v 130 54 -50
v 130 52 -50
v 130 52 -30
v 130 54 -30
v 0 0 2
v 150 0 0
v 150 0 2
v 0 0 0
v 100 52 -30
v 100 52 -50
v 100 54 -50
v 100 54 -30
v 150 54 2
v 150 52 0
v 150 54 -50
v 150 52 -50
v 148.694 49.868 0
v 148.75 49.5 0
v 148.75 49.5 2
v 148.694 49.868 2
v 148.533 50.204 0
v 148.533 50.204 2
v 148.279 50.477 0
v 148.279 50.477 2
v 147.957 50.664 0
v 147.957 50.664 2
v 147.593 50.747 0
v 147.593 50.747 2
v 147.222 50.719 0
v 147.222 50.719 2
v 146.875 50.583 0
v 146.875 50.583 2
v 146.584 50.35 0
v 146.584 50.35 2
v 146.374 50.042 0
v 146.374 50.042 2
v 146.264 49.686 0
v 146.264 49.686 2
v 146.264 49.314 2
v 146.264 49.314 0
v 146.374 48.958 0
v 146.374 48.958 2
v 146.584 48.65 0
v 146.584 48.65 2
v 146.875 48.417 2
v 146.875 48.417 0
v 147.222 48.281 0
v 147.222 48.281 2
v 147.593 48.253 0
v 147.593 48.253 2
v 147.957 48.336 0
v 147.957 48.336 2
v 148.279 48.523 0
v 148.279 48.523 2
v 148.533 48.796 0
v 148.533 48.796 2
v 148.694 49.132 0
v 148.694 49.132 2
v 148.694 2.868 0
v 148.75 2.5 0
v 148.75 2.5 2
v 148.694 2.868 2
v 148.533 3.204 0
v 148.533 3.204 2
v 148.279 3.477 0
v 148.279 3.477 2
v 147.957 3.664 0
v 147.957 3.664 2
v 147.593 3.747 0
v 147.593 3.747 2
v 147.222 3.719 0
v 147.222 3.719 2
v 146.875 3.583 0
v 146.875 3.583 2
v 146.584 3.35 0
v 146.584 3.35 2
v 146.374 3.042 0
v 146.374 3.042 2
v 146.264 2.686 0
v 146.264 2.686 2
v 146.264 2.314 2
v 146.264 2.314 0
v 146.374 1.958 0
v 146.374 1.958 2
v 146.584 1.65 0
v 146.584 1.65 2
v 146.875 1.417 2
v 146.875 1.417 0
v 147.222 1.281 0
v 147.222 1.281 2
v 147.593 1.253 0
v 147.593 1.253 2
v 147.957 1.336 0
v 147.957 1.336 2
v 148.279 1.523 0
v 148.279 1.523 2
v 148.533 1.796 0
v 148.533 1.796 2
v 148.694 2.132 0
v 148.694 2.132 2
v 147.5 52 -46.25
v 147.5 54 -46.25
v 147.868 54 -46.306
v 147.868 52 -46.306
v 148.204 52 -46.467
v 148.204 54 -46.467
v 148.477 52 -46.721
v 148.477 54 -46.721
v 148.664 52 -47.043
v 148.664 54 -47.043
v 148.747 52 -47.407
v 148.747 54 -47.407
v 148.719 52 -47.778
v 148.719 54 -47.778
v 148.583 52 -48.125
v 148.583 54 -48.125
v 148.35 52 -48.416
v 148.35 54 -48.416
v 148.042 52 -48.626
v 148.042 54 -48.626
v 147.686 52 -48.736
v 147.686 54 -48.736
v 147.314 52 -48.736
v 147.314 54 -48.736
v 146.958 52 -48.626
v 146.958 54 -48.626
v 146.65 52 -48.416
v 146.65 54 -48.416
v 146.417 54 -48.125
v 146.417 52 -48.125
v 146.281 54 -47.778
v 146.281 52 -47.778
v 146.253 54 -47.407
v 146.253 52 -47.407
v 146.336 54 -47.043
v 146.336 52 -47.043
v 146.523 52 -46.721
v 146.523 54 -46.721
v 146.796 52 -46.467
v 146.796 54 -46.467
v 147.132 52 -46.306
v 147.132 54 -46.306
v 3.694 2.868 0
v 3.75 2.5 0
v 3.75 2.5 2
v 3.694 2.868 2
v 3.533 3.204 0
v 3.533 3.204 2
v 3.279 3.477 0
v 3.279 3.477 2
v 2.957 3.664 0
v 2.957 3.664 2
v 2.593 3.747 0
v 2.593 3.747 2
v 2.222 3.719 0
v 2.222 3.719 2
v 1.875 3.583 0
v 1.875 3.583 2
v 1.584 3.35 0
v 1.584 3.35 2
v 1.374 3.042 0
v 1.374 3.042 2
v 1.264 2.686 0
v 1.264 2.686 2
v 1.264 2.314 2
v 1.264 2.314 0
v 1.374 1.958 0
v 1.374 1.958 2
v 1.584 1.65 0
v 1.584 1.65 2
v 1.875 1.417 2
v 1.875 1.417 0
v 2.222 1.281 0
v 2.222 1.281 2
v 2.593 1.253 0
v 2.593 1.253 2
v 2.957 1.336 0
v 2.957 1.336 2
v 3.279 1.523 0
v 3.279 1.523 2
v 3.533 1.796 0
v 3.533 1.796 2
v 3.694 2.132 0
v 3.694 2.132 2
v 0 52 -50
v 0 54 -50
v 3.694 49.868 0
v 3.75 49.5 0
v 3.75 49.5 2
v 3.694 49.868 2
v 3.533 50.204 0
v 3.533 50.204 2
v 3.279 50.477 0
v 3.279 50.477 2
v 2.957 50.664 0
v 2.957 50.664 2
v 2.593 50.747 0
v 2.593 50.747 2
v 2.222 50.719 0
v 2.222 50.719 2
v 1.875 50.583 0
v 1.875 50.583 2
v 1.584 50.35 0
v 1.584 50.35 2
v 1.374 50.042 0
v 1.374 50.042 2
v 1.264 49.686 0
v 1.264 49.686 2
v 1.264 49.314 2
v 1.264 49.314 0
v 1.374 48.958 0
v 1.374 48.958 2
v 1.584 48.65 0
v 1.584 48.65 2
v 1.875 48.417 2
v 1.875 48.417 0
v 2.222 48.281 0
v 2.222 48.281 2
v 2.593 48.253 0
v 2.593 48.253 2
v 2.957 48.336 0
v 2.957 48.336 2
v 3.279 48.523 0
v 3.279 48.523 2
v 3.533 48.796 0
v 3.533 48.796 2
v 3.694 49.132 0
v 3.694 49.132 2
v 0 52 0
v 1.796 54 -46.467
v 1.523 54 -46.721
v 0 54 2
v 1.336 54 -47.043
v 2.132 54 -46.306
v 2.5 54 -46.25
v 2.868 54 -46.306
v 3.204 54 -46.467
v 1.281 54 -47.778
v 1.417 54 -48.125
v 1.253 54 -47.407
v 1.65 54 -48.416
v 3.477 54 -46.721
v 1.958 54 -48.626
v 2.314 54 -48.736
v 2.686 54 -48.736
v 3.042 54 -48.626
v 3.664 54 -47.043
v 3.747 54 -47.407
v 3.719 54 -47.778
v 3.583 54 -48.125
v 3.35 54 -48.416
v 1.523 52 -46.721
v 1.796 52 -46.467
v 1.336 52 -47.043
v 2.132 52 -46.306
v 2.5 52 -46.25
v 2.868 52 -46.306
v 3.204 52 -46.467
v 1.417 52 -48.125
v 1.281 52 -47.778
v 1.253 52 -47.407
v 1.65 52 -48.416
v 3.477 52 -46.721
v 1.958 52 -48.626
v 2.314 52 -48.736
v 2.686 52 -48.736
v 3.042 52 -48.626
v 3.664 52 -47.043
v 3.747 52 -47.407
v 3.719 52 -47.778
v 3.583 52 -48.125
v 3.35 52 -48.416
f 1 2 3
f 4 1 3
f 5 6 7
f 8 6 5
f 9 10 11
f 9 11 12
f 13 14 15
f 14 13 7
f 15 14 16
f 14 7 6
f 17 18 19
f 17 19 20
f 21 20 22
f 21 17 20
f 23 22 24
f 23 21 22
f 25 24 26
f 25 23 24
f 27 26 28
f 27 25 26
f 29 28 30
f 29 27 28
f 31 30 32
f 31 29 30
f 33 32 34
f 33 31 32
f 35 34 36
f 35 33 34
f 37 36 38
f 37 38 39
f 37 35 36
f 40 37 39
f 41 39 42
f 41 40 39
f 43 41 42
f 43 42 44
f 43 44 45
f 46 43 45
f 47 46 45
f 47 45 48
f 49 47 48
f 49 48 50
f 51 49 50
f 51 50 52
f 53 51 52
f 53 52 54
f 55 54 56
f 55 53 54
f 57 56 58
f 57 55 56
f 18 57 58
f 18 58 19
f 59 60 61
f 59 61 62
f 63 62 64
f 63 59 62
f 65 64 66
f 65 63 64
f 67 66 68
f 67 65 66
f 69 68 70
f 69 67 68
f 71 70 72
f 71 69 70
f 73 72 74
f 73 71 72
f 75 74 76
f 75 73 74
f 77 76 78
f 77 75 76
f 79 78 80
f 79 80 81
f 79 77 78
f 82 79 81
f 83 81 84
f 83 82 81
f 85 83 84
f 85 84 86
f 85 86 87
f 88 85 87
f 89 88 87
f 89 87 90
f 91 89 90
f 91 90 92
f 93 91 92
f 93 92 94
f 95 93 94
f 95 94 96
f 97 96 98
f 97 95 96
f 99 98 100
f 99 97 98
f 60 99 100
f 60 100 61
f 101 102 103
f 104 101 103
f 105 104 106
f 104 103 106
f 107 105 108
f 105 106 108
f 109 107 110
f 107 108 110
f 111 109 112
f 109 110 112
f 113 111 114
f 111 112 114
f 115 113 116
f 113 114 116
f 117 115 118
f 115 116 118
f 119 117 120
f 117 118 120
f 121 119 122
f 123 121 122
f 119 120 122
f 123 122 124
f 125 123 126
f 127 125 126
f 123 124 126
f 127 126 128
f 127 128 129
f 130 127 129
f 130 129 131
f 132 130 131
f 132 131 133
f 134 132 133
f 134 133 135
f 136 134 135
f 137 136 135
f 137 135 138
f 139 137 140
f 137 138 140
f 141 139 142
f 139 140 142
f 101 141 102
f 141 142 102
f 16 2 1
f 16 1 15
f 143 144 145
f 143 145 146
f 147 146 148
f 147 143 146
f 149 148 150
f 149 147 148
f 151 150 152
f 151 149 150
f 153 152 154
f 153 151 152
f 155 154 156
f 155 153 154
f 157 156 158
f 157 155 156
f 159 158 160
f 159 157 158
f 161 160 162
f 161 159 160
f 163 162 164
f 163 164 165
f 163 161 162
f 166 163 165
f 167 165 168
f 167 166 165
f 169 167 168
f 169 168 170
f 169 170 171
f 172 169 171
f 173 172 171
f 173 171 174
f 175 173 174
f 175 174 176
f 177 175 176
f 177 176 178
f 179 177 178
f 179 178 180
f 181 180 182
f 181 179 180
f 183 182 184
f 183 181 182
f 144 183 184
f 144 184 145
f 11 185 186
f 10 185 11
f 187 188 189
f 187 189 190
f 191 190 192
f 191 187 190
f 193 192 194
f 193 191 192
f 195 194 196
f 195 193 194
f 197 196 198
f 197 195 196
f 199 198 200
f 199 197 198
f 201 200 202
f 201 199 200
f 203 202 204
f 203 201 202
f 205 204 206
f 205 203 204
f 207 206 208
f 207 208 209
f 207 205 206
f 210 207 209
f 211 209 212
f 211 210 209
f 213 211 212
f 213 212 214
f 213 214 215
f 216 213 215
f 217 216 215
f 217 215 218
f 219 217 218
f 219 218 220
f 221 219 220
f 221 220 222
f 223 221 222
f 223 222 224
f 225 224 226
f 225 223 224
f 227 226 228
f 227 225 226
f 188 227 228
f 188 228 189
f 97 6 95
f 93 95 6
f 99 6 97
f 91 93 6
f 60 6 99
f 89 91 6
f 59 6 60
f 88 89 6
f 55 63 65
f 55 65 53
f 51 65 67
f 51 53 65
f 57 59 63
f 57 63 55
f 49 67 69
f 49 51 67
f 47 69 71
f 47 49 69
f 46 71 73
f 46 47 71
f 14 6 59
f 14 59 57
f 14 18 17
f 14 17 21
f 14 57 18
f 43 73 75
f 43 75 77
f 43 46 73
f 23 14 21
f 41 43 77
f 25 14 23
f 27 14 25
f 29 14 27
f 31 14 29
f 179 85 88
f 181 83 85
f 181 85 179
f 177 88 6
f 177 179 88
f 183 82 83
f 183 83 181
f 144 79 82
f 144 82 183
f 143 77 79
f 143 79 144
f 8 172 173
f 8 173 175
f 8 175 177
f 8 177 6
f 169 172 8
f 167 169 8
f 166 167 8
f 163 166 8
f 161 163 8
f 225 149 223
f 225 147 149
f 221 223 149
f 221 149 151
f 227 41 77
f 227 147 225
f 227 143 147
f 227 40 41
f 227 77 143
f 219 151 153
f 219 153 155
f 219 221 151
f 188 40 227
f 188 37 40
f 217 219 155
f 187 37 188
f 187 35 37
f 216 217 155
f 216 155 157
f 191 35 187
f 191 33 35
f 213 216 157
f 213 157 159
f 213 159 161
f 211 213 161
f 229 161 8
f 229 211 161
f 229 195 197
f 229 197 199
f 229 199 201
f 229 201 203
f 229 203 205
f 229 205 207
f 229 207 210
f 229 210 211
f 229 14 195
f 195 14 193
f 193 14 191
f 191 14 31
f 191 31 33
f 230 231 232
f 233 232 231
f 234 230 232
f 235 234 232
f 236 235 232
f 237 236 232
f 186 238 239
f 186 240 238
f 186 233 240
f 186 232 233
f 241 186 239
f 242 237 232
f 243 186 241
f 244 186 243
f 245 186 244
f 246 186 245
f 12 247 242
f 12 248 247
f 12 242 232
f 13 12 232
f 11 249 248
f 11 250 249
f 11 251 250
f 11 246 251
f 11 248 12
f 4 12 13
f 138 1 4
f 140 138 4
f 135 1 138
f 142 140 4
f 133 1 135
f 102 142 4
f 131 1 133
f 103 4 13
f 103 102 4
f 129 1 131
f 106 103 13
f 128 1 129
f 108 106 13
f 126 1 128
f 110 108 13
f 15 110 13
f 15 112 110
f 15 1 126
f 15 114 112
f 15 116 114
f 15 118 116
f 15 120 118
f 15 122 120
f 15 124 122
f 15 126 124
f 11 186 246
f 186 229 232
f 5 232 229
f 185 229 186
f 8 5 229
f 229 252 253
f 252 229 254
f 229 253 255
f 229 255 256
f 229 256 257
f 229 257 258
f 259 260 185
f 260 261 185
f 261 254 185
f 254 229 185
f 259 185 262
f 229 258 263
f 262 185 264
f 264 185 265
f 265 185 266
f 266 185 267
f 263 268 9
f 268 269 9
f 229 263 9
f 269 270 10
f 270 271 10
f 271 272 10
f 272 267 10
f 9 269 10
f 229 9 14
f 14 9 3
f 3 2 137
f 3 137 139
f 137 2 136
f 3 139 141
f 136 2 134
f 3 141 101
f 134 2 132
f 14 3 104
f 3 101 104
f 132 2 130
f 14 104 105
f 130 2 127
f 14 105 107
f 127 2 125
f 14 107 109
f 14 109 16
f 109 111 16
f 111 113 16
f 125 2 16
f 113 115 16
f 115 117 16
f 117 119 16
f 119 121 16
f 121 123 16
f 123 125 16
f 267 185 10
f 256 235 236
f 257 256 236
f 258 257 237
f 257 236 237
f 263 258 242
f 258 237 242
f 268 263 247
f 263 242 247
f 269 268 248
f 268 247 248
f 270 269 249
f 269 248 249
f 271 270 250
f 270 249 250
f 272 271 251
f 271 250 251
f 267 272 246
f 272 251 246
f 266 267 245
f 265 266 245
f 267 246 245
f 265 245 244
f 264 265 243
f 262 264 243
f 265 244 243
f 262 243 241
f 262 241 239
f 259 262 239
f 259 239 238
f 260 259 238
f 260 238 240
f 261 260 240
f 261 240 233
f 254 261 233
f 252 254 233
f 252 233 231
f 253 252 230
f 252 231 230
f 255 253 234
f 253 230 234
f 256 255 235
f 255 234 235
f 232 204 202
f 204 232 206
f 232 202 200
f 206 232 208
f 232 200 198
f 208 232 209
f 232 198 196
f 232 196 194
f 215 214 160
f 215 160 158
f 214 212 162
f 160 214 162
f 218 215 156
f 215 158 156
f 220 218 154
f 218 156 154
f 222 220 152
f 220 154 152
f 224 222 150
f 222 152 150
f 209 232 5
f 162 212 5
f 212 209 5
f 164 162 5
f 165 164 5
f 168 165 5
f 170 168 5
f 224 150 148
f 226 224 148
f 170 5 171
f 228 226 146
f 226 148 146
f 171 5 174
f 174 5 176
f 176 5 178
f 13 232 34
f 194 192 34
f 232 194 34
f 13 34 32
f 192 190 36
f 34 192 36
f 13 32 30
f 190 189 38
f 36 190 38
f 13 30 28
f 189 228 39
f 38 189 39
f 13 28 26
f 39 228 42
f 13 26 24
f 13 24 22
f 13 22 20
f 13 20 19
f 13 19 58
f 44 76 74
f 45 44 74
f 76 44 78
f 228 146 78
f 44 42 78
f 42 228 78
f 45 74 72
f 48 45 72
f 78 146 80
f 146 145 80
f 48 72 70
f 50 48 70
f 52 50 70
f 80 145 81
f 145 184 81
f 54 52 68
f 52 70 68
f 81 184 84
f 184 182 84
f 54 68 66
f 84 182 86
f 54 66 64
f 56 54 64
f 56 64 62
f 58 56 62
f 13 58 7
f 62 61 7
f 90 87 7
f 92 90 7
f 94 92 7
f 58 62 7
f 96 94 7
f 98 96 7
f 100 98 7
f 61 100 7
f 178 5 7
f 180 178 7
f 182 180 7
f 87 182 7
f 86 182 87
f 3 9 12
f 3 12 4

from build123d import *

# Parameters (mm, degrees)
SKIZZE1_R                       = 1.25
AUFSATZ_LINEAR_AUSTRAGEN1_DEPTH = 2
SKIZZE2_W                       = 150
SKIZZE2_H                       = 52
AUFSATZ_LINEAR_AUSTRAGEN2_DEPTH = 2
SKIZZE3_W                       = 30
SKIZZE3_H                       = 20
SCHNITT_LINEAR_AUSTRAGEN1_DEPTH = 2
SKIZZE5_R                       = 1.25
SCHNITT_LINEAR_AUSTRAGEN2_DEPTH = 2


with BuildPart() as part:
    # Skizze1 → Aufsatz-Linear austragen1 (new body)
    # profile 1 of 2: a face of its own
    with BuildSketch(Plane.XY):
        with BuildLine():
            Line((148, 39.858571571), (148, 12.141428429))
            ThreePointArc((148, 12.141428429), (147.219544457, 8.268445082), (145, 5))
            ThreePointArc((145, 5), (141.731554918, 2.780455543), (137.858571571, 2))
            Line((137.858571571, 2), (12.141428429, 2))
            ThreePointArc((12.141428429, 2), (8.268445082, 2.780455543), (5, 5))
            ThreePointArc((5, 5), (2.780455543, 8.268445082), (2, 12.141428429))
            Line((2, 12.141428429), (2, 39.858571571))
            ThreePointArc((2, 39.858571571), (2.780455543, 43.731554918), (5, 47))
            Line((5, 47), (5, 52))
            Line((5, 52), (145, 52))
            Line((145, 52), (145, 47))
            ThreePointArc((145, 47), (147.219544457, 43.731554918), (148, 39.858571571))
        make_face()
    # profile 2 of 2: a face of its own
    with BuildSketch(Plane.XY):
        with BuildLine():
            ThreePointArc((148, 39.858571571), (147.219544457, 43.731554918), (145, 47))
            Line((145, 47), (145, 52))
            Line((145, 52), (150, 52))
            Line((150, 52), (150, 0))
            Line((150, 0), (0, 0))
            Line((0, 0), (0, 52))
            Line((0, 52), (5, 52))
            Line((5, 52), (5, 47))
            ThreePointArc((5, 47), (2.780455543, 43.731554918), (2, 39.858571571))
            Line((2, 39.858571571), (2, 12.141428429))
            ThreePointArc((2, 12.141428429), (2.780455543, 8.268445082), (5, 5))
            ThreePointArc((5, 5), (8.268445082, 2.780455543), (12.141428429, 2))
            Line((12.141428429, 2), (137.858571571, 2))
            ThreePointArc((137.858571571, 2), (141.731554918, 2.780455543), (145, 5))
            ThreePointArc((145, 5), (147.219544457, 8.268445082), (148, 12.141428429))
            Line((148, 12.141428429), (148, 39.858571571))
        make_face()
        with Locations((2.5, 49.5)):
            Circle(SKIZZE1_R, mode=Mode.SUBTRACT)
        with Locations((2.5, 2.5)):
            Circle(SKIZZE1_R, mode=Mode.SUBTRACT)
        with Locations((147.5, 49.5)):
            Circle(SKIZZE1_R, mode=Mode.SUBTRACT)
        with Locations((147.5, 2.5)):
            Circle(SKIZZE1_R, mode=Mode.SUBTRACT)
    extrude(amount=AUFSATZ_LINEAR_AUSTRAGEN1_DEPTH)

    # Skizze2 → Aufsatz-Linear austragen2 (add)
    with BuildSketch(Plane(origin=(0, 52, 0), x_dir=(1, 0, 0), z_dir=(0, 1, 0))):
        with Locations((75, 24)):
            Rectangle(SKIZZE2_W, SKIZZE2_H)
    extrude(amount=AUFSATZ_LINEAR_AUSTRAGEN2_DEPTH)

    # Skizze3 → Schnitt-Linear austragen1 (cut)
    with BuildSketch(Plane.XZ.offset(-52)):
        with Locations((115, -40)):
            Rectangle(SKIZZE3_W, SKIZZE3_H)
    extrude(amount=-SCHNITT_LINEAR_AUSTRAGEN1_DEPTH, mode=Mode.SUBTRACT)

    # Skizze5 → Schnitt-Linear austragen2 (cut)
    with BuildSketch(Plane(origin=(0, 54, 0), x_dir=(1, 0, 0), z_dir=(0, 1, 0))):
        with Locations(Location((147.5, 47.5, 0), (0, 0, 270))):
            Circle(SKIZZE5_R)
        with Locations(Location((2.5, 47.5, 0), (0, 0, 270))):
            Circle(SKIZZE5_R)
    extrude(amount=-SCHNITT_LINEAR_AUSTRAGEN2_DEPTH, mode=Mode.SUBTRACT)


solid = part.part
